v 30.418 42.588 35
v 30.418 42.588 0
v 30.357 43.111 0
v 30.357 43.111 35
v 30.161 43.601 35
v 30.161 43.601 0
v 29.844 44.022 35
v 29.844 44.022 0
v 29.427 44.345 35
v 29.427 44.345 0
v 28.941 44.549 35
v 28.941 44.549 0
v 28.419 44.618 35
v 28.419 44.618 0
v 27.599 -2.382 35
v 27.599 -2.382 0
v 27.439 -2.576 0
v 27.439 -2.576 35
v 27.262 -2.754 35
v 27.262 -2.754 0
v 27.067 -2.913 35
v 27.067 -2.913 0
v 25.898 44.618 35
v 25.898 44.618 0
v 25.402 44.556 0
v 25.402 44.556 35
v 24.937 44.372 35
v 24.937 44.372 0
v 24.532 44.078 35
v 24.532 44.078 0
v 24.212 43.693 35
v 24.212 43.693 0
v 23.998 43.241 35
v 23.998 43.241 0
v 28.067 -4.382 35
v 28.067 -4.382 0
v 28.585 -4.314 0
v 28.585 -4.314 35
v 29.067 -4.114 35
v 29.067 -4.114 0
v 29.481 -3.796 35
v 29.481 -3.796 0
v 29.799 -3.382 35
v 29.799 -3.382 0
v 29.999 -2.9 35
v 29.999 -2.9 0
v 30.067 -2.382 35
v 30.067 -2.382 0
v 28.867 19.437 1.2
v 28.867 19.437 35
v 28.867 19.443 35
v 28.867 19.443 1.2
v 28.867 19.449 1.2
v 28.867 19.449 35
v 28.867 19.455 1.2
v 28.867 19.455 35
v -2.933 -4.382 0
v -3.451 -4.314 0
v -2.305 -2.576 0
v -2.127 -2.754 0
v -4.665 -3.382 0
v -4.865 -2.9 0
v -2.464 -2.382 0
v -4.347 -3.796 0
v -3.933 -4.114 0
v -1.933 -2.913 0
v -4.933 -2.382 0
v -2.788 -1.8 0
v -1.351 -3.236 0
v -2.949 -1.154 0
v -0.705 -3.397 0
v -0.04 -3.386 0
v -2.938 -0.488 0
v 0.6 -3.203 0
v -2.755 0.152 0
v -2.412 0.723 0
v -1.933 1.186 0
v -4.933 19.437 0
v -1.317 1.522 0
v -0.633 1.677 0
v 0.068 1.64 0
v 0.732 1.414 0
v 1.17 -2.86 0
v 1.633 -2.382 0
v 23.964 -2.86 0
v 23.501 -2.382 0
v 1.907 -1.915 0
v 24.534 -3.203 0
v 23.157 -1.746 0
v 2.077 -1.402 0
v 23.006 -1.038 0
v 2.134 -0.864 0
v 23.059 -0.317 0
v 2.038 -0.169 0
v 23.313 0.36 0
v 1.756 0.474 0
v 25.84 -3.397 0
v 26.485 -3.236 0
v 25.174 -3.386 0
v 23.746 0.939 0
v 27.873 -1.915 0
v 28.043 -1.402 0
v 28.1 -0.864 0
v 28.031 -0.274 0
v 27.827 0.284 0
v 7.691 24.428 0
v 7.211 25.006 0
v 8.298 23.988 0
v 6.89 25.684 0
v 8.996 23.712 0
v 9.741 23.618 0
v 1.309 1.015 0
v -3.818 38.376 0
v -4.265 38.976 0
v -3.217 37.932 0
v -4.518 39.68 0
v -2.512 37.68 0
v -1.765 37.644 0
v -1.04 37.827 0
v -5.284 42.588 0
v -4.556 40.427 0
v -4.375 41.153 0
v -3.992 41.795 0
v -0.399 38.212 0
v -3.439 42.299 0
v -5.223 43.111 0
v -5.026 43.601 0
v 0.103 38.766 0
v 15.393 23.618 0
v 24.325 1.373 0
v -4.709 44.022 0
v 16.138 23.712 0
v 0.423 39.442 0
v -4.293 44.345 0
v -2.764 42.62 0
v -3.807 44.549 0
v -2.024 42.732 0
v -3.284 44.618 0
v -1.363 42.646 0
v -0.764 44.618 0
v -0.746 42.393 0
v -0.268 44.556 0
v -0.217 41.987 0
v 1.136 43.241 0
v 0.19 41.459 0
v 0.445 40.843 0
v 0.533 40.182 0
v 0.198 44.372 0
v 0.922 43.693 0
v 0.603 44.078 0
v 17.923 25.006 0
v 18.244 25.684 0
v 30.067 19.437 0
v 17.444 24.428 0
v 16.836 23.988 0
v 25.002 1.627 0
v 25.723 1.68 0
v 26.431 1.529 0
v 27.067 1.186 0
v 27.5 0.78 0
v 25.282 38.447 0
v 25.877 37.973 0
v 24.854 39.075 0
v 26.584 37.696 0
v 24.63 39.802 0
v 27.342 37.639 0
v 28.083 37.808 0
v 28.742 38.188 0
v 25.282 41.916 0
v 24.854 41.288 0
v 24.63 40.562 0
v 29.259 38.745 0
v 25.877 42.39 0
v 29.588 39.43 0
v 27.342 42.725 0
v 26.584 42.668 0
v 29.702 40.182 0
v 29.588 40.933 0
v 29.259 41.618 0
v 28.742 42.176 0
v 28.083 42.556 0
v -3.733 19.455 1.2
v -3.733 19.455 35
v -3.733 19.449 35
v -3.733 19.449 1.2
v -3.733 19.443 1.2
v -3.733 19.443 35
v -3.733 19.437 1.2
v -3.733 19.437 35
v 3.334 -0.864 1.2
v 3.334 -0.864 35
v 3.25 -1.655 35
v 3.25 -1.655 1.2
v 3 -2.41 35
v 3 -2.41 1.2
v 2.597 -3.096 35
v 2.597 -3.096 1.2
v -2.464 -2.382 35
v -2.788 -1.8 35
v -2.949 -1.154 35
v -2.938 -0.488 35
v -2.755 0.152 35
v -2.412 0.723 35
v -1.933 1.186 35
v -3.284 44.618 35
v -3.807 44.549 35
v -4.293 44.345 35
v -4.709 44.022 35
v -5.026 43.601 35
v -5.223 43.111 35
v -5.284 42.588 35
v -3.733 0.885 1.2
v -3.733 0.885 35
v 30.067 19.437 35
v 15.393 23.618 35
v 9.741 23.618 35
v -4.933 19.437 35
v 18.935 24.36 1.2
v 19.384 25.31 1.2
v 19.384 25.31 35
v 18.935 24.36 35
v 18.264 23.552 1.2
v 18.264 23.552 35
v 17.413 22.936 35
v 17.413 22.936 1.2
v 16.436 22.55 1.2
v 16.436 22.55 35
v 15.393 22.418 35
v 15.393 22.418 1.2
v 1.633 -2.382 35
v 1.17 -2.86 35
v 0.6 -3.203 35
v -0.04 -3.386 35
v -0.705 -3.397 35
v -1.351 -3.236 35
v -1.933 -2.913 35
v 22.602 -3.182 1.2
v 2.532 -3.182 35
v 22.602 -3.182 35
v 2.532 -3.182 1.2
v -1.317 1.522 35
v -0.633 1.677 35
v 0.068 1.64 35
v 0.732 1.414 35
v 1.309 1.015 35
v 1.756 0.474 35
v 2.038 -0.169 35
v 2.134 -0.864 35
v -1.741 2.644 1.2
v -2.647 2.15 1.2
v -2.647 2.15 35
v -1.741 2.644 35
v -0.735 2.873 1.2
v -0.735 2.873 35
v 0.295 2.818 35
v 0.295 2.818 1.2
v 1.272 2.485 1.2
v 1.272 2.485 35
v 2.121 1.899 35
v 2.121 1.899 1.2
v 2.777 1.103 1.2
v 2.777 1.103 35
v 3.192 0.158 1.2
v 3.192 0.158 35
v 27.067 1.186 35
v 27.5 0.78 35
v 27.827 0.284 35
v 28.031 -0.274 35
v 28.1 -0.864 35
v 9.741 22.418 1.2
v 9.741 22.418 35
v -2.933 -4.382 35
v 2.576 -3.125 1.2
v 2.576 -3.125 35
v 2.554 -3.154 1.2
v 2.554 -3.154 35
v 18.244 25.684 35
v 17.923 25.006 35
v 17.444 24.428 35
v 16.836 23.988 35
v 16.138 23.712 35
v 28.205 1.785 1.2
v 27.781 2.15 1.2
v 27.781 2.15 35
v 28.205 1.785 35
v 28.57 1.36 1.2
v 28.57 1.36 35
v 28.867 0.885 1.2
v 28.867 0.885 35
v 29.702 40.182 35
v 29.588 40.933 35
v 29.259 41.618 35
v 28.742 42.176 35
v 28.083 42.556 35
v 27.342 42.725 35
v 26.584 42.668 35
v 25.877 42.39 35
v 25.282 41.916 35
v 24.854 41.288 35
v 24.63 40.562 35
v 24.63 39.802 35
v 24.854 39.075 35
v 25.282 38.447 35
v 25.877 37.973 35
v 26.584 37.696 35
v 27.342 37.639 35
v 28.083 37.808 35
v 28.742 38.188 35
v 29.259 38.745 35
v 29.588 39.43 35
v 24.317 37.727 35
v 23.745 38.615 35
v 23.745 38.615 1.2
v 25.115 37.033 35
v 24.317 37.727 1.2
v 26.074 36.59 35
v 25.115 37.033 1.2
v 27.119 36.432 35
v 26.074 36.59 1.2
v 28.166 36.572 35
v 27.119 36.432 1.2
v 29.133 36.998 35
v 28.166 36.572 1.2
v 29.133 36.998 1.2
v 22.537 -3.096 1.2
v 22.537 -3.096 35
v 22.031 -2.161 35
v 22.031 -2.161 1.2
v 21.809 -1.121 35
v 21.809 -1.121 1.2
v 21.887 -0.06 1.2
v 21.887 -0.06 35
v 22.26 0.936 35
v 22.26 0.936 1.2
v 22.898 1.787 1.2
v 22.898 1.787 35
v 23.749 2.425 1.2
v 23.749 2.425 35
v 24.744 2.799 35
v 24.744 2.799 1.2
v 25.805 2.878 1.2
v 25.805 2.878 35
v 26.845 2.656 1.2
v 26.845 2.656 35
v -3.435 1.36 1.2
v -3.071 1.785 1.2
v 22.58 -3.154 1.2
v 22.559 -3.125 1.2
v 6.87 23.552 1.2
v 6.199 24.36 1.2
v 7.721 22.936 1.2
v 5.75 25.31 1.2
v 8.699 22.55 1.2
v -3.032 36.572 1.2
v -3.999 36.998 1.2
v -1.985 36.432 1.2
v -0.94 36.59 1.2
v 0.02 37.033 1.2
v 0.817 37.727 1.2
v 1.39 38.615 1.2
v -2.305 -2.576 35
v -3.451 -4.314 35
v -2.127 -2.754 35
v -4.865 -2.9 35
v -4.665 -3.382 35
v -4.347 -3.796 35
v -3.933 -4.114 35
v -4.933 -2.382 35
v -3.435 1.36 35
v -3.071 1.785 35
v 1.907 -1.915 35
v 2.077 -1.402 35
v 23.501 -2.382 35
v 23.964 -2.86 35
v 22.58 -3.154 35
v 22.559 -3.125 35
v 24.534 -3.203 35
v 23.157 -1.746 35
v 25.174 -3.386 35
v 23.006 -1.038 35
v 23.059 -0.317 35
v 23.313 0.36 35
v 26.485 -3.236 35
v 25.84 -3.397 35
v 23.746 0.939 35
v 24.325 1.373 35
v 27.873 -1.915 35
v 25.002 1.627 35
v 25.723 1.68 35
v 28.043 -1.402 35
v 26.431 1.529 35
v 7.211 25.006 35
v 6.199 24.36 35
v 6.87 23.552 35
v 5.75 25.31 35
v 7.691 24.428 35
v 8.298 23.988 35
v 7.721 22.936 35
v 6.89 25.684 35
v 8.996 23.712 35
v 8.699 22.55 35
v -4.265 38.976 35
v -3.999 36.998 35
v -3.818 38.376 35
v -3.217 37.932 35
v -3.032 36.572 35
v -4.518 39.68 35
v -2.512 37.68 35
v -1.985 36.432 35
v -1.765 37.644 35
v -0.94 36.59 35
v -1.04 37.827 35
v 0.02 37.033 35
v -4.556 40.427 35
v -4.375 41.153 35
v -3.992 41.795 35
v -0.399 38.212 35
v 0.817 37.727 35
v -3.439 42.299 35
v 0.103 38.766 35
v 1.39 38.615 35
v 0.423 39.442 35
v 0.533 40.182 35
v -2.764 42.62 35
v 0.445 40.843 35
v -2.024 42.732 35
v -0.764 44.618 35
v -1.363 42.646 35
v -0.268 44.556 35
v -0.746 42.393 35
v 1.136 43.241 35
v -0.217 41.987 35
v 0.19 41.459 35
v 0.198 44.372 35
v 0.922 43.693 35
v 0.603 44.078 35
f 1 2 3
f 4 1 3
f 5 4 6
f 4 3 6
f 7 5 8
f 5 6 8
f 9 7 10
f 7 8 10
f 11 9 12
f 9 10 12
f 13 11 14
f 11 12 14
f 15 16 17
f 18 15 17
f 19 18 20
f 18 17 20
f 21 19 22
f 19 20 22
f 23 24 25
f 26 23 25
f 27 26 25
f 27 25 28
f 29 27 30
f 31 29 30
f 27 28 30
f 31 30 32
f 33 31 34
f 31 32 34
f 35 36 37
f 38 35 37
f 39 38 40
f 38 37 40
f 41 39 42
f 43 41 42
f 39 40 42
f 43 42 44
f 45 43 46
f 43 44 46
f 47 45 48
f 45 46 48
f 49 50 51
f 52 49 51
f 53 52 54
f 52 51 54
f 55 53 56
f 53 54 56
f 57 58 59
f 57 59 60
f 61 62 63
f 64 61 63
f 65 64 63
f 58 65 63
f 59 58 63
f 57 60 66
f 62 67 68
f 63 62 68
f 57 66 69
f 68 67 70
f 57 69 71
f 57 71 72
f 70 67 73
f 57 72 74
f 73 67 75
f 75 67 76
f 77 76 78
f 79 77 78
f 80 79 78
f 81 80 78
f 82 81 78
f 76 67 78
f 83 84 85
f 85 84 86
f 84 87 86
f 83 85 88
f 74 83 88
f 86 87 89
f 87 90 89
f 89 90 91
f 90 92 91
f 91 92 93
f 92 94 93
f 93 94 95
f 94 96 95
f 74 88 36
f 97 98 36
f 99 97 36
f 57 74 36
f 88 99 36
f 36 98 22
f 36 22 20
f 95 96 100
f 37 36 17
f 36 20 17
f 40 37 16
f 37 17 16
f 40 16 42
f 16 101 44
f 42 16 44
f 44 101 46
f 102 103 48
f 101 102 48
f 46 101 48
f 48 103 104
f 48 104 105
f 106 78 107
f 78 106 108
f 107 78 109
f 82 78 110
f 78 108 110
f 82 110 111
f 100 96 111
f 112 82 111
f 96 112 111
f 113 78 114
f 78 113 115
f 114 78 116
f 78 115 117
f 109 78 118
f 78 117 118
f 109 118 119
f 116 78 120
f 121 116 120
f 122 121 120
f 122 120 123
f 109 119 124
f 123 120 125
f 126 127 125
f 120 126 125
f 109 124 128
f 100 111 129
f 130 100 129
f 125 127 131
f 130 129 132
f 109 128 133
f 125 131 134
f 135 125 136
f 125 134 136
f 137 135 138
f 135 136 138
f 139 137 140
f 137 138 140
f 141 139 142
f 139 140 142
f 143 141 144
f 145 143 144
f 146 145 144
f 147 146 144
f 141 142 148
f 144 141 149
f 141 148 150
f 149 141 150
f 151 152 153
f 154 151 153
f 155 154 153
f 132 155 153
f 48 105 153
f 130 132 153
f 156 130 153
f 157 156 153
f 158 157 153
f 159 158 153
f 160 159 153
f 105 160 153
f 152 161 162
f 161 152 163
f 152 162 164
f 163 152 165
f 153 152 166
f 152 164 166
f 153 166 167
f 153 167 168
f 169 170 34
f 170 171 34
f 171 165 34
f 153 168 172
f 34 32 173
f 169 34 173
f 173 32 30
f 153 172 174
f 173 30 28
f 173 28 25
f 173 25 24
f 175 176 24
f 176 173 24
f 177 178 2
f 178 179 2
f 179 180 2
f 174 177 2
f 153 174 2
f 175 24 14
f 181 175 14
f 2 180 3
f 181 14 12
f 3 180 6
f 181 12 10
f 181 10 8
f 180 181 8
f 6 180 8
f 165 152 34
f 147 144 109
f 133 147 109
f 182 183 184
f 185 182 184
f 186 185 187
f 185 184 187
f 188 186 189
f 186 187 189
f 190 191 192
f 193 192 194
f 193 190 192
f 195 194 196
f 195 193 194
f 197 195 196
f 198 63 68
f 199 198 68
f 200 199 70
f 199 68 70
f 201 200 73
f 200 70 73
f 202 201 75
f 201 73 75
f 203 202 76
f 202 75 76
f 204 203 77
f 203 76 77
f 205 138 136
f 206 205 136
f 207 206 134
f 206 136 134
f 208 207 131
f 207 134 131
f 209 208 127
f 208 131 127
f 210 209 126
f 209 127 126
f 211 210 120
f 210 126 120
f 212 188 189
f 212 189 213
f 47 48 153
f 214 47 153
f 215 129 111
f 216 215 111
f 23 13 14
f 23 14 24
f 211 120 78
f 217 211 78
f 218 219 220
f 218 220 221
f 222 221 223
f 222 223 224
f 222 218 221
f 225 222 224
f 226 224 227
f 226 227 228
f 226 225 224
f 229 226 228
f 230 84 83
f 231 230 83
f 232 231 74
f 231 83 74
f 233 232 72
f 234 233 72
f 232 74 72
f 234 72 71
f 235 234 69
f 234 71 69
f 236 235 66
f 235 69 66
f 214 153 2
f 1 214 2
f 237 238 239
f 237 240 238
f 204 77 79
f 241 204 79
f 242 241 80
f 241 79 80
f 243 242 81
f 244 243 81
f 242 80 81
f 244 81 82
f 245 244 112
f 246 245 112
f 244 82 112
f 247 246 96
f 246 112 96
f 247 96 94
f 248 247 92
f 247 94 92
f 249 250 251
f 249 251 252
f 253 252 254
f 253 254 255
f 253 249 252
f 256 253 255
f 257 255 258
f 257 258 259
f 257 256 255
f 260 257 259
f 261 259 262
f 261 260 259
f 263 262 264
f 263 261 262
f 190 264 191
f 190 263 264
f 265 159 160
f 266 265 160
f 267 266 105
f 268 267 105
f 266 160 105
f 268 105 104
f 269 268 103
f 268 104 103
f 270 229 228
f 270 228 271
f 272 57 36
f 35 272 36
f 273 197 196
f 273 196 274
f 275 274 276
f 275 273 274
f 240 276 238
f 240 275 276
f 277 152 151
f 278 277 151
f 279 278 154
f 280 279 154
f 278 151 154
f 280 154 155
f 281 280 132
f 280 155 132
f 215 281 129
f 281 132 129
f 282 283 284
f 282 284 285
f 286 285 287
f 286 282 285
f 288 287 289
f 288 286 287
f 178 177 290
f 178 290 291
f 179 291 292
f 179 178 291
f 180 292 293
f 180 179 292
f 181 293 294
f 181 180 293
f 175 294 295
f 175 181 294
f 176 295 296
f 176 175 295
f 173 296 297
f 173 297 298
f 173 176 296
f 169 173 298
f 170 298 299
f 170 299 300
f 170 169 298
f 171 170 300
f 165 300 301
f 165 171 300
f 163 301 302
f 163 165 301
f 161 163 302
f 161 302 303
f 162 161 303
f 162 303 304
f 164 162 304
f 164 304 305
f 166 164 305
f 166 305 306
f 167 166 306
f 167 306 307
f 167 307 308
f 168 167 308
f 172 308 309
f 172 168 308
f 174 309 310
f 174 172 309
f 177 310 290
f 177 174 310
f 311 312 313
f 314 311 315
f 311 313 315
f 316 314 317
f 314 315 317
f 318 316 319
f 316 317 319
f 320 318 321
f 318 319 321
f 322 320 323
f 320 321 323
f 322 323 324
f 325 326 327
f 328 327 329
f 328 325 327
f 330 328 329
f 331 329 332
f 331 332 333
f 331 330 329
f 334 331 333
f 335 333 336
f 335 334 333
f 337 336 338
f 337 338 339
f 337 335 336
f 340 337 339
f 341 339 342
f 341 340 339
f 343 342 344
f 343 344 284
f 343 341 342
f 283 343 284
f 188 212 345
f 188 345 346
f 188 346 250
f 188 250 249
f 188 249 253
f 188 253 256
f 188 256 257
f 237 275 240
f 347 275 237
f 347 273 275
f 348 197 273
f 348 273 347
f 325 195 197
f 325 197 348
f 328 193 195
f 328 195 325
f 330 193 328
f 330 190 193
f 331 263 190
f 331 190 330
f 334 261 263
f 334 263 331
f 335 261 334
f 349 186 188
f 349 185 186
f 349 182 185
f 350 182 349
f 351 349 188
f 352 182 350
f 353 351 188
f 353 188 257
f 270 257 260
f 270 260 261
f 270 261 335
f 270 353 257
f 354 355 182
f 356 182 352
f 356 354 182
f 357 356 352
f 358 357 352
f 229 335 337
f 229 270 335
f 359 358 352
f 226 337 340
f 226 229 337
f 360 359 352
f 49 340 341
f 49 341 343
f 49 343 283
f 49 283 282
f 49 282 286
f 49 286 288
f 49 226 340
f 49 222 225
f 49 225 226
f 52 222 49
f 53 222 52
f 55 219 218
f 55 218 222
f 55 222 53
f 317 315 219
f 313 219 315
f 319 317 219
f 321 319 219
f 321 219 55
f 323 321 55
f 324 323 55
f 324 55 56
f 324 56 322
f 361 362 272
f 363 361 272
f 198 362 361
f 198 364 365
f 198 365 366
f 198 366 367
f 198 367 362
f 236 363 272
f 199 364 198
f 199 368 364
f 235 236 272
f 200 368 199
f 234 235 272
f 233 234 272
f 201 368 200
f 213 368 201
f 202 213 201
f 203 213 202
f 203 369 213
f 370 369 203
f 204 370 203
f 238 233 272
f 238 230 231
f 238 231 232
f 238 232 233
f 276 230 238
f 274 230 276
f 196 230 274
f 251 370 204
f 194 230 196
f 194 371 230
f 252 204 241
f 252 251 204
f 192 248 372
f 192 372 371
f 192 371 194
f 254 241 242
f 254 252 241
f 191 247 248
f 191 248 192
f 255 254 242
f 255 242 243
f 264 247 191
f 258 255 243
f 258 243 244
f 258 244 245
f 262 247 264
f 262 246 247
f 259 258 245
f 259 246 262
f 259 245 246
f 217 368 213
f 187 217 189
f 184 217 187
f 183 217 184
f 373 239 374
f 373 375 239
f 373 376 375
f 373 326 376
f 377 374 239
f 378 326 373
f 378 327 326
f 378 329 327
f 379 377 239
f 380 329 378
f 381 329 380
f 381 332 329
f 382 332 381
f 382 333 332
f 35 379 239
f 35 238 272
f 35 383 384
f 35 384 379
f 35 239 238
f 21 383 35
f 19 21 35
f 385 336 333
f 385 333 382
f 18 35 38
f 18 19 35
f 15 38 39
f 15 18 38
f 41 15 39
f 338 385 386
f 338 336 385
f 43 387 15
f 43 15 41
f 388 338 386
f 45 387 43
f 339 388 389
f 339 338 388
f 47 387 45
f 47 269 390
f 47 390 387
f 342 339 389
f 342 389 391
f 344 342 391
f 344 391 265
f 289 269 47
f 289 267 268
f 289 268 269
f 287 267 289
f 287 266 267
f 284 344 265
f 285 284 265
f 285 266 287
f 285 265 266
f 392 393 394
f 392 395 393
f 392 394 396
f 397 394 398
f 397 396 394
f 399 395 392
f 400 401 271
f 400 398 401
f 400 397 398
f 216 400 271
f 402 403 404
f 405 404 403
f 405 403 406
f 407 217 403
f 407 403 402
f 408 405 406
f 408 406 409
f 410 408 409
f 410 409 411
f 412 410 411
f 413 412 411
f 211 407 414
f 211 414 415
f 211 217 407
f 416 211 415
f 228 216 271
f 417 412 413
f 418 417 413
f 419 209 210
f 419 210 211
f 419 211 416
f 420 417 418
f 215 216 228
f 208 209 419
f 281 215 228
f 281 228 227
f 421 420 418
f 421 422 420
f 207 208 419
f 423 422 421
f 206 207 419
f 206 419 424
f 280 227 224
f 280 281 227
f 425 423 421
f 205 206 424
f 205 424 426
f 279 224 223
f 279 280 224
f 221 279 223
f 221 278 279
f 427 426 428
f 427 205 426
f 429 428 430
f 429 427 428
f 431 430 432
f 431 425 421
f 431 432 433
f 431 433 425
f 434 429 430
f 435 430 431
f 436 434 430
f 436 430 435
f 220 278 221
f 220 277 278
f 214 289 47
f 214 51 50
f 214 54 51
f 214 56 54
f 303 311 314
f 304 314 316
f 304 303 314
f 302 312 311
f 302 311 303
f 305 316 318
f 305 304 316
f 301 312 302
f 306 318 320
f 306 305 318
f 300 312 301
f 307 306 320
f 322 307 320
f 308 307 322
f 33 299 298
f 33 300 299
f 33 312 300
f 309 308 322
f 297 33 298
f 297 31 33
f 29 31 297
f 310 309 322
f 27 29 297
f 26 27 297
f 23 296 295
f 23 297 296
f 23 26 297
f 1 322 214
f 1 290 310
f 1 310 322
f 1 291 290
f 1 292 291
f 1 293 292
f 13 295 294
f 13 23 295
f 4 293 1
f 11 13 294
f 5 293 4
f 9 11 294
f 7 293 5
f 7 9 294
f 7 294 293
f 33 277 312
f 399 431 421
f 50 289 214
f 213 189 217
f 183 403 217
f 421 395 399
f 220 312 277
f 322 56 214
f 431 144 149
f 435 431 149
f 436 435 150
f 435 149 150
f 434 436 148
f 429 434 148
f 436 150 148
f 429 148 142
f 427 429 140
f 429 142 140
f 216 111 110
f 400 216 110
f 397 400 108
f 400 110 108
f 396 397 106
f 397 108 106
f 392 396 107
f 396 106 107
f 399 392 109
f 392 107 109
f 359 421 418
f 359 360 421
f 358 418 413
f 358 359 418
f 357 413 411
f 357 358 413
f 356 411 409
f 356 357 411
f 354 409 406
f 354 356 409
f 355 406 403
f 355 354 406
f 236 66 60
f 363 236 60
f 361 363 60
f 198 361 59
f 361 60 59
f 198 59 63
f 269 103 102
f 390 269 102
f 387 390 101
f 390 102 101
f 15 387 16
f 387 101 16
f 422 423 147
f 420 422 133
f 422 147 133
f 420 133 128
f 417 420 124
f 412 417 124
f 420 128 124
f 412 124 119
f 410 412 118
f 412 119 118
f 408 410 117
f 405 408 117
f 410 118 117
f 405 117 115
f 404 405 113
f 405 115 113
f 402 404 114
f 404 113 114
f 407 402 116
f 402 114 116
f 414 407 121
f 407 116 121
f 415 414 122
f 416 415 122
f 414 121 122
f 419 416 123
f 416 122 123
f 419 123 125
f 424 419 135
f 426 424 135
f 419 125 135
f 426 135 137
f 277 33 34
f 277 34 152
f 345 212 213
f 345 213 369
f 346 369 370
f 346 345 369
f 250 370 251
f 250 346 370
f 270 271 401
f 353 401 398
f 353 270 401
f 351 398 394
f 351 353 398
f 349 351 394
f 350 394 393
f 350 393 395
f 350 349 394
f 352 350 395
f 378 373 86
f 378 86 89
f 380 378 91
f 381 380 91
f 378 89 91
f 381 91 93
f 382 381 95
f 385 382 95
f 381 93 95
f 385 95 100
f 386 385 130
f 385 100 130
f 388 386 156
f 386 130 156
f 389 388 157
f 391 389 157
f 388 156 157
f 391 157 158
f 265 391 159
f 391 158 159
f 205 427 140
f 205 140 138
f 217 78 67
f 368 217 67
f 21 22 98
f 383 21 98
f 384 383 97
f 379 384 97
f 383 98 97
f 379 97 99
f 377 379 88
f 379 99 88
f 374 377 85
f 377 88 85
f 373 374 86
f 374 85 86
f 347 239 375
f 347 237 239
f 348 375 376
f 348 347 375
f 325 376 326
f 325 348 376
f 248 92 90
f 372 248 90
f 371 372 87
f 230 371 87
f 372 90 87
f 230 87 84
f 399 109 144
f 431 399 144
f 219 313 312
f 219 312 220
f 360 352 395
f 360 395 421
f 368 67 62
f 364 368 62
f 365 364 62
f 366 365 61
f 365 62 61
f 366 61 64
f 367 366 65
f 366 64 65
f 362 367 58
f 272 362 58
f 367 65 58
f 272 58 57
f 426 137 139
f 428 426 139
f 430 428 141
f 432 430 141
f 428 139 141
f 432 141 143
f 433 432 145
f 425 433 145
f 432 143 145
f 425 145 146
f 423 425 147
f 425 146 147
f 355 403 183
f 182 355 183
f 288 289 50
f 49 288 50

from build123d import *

# Parameters (mm, degrees)
F0_R     = 2.55
F0_W     = 7.4266694462
F0_H     = 7.0167635567
F0_W_2   = 8.4439013153
F0_H_2   = 2.6164194569
F0_H_3   = 1.3082097284
F1_DEPTH = 35
F2_T     = -1.2


with BuildPart() as f1:
    # F0 (on Top) → F1 (new body)
    with BuildSketch(Plane.XY):
        with BuildLine():
            Line((12.5671070093, 2.2891284898), (12.5671070093, -4.3818661943))
            Line((12.5671070093, -4.3818661943), (27.0671070093, -4.3818661943))
            Line((27.0671070093, -4.3818661943), (27.0671070093, -2.9131628679))
            ThreePointArc((27.0671070093, -2.9131628679), (25.1741554355, -3.3857602737), (23.5011908077, -2.3818661943))
            ThreePointArc((23.5011908077, -2.3818661943), (23.7463344607, 0.9390381298), (27.0671070093, 1.1859604264))
            ThreePointArc((27.0671070093, 1.1859604264), (27.8271392688, 0.2839446425), (28.0999395649, -0.8636012208))
            ThreePointArc((28.0999395649, -0.8636012208), (27.9713863773, -1.6630356049), (27.5986883221, -2.3818661943))
            Line((27.5986883221, -2.3818661943), (30.0671070093, -2.3818661943))
            Line((30.0671070093, -2.3818661943), (30.0671070093, 19.4367093172))
            Line((30.0671070093, 19.4367093172), (30.4183758122, 42.5877915199))
            ThreePointArc((30.4183758122, 42.5877915199), (29.8435067876, 44.0215787509), (28.418605989, 44.6181338057))
            Line((28.418605989, 44.6181338057), (25.8984067957, 44.6181338057))
            ThreePointArc((25.8984067957, 44.6181338057), (24.724883132, 44.2376529352), (23.9978627735, 43.2409760165))
            Line((23.9978627735, 43.2409760165), (18.2440858049, 25.6838704894))
            ThreePointArc((18.2440858049, 25.6838704894), (17.1535552671, 24.1888551114), (15.3932697716, 23.6181338057))
            Line((15.3932697716, 23.6181338057), (12.5671070093, 23.6181338057))
            Line((12.5671070093, 23.6181338057), (12.5671070093, 13.2305212319))
            Line((12.5671070093, 13.2305212319), (19.9937764555, 13.2305212319))
            Line((19.9937764555, 13.2305212319), (19.9937764555, 6.2137576751))
            Line((19.9937764555, 6.2137576751), (28.4376777709, 6.2137576751))
            Line((28.4376777709, 6.2137576751), (28.4376777709, 3.5973382182))
            Line((28.4376777709, 3.5973382182), (19.9937764555, 3.5973382182))
            Line((19.9937764555, 3.5973382182), (19.9937764555, 2.2891284898))
            Line((19.9937764555, 2.2891284898), (12.5671070093, 2.2891284898))
        make_face()
        with Locations((27.1516455619, 40.181864053)):
            Circle(F0_R, mode=Mode.SUBTRACT)
        with BuildLine():
            Line((-1.9328929907, -4.3818661943), (12.5671070093, -4.3818661943))
            Line((12.5671070093, -4.3818661943), (12.5671070093, 2.2891284898))
            Line((12.5671070093, 2.2891284898), (5.1404375632, 2.2891284898))
            Line((5.1404375632, 2.2891284898), (5.1404375632, 3.5973382182))
            Line((5.1404375632, 3.5973382182), (-3.3034637522, 3.5973382182))
            Line((-3.3034637522, 3.5973382182), (-3.3034637522, 6.2137576751))
            Line((-3.3034637522, 6.2137576751), (5.1404375632, 6.2137576751))
            Line((5.1404375632, 6.2137576751), (5.1404375632, 13.2305212319))
            Line((5.1404375632, 13.2305212319), (12.5671070093, 13.2305212319))
            Line((12.5671070093, 13.2305212319), (12.5671070093, 23.6181338057))
            Line((12.5671070093, 23.6181338057), (9.7409442471, 23.6181338057))
            ThreePointArc((9.7409442471, 23.6181338057), (7.9806587516, 24.1888551114), (6.8901282137, 25.6838704894))
            Line((6.8901282137, 25.6838704894), (1.1363512452, 43.2409760165))
            ThreePointArc((1.1363512452, 43.2409760165), (0.4093308866, 44.2376529352), (-0.764192777, 44.6181338057))
            Line((-0.764192777, 44.6181338057), (-2.0242923737, 44.6181338057))
            Line((-2.0242923737, 44.6181338057), (-3.2843919703, 44.6181338057))
            Line((-3.2843919703, 44.6181338057), (-3.2843919703, 42.6181338057))
            Line((-3.2843919703, 42.6181338057), (-5.2841617935, 42.5877915199))
            Line((-5.2841617935, 42.5877915199), (-4.9328929907, 19.4367093172))
            Line((-4.9328929907, 19.4367093172), (-4.9328929907, -2.3818661943))
            Line((-4.9328929907, -2.3818661943), (-2.4644743034, -2.3818661943))
            ThreePointArc((-2.4644743034, -2.3818661943), (-2.9378845991, -0.4878170914), (-1.9328929907, 1.1859604264))
            ThreePointArc((-1.9328929907, 1.1859604264), (0.7318203171, 1.4135984832), (2.1342744538, -0.8636012208))
            ThreePointArc((2.1342744538, -0.8636012208), (2.0057212662, -1.6630356049), (1.633023211, -2.3818661943))
            ThreePointArc((1.633023211, -2.3818661943), (-0.0399414169, -3.3857602737), (-1.9328929907, -2.9131628679))
            Line((-1.9328929907, -2.9131628679), (-1.9328929907, -4.3818661943))
        make_face()
        with BuildLine():
            ThreePointArc((0.5325684568, 40.181864053), (-3.8181265316, 38.3763177205), (-2.0242923737, 42.7318548234))
            ThreePointArc((-2.0242923737, 42.7318548234), (-0.2167365548, 41.9874103855), (0.5325684568, 40.181864053))
        make_face(mode=Mode.SUBTRACT)
        with BuildLine():
            Line((27.0671070093, -2.9131628679), (27.0671070093, -4.3818661943))
            Line((27.0671070093, -4.3818661943), (28.0671070093, -4.3818661943))
            ThreePointArc((28.0671070093, -4.3818661943), (29.4813205717, -3.7960797567), (30.0671070093, -2.3818661943))
            Line((30.0671070093, -2.3818661943), (27.5986883221, -2.3818661943))
            ThreePointArc((27.5986883221, -2.3818661943), (27.3525789154, -2.6672063249), (27.0671070093, -2.9131628679))
        make_face()
        with BuildLine():
            Line((-2.9328929907, -4.3818661943), (-1.9328929907, -4.3818661943))
            Line((-1.9328929907, -4.3818661943), (-1.9328929907, -2.9131628679))
            ThreePointArc((-1.9328929907, -2.9131628679), (-2.2183648967, -2.6672063249), (-2.4644743034, -2.3818661943))
            Line((-2.4644743034, -2.3818661943), (-4.9328929907, -2.3818661943))
            ThreePointArc((-4.9328929907, -2.3818661943), (-4.347106553, -3.7960797567), (-2.9328929907, -4.3818661943))
        make_face()
        with BuildLine():
            ThreePointArc((-3.2843919703, 44.6181338057), (-4.7092927689, 44.0215787509), (-5.2841617935, 42.5877915199))
            Line((-5.2841617935, 42.5877915199), (-3.2843919703, 42.6181338057))
            Line((-3.2843919703, 42.6181338057), (-3.2843919703, 44.6181338057))
        make_face()
        with Locations((8.8537722862, 9.7221394535)):
            Rectangle(F0_W, F0_H)
        with Locations((16.2804417324, 9.7221394535)):
            Rectangle(F0_W, F0_H)
        with Locations((24.2157271132, 4.9055479467)):
            Rectangle(F0_W_2, F0_H_2)
        with Locations((8.8537722862, 4.9055479467)):
            Rectangle(F0_W, F0_H_2)
        with Locations((0.9184869055, 4.9055479467)):
            Rectangle(F0_W_2, F0_H_2)
        with Locations((8.8537722862, 2.943233354)):
            Rectangle(F0_W, F0_H_3)
        with Locations((16.2804417324, 4.9055479467)):
            Rectangle(F0_W, F0_H_2)
        with Locations((16.2804417324, 2.943233354)):
            Rectangle(F0_W, F0_H_3)
    extrude(amount=F1_DEPTH)

    # F2
    f2_openings = [f1.faces().sort_by_distance(p)[0] for p in [
        (12.567107, 16.00407, 35),
    ]]
    offset(amount=F2_T, openings=f2_openings)


solid = f1.part
